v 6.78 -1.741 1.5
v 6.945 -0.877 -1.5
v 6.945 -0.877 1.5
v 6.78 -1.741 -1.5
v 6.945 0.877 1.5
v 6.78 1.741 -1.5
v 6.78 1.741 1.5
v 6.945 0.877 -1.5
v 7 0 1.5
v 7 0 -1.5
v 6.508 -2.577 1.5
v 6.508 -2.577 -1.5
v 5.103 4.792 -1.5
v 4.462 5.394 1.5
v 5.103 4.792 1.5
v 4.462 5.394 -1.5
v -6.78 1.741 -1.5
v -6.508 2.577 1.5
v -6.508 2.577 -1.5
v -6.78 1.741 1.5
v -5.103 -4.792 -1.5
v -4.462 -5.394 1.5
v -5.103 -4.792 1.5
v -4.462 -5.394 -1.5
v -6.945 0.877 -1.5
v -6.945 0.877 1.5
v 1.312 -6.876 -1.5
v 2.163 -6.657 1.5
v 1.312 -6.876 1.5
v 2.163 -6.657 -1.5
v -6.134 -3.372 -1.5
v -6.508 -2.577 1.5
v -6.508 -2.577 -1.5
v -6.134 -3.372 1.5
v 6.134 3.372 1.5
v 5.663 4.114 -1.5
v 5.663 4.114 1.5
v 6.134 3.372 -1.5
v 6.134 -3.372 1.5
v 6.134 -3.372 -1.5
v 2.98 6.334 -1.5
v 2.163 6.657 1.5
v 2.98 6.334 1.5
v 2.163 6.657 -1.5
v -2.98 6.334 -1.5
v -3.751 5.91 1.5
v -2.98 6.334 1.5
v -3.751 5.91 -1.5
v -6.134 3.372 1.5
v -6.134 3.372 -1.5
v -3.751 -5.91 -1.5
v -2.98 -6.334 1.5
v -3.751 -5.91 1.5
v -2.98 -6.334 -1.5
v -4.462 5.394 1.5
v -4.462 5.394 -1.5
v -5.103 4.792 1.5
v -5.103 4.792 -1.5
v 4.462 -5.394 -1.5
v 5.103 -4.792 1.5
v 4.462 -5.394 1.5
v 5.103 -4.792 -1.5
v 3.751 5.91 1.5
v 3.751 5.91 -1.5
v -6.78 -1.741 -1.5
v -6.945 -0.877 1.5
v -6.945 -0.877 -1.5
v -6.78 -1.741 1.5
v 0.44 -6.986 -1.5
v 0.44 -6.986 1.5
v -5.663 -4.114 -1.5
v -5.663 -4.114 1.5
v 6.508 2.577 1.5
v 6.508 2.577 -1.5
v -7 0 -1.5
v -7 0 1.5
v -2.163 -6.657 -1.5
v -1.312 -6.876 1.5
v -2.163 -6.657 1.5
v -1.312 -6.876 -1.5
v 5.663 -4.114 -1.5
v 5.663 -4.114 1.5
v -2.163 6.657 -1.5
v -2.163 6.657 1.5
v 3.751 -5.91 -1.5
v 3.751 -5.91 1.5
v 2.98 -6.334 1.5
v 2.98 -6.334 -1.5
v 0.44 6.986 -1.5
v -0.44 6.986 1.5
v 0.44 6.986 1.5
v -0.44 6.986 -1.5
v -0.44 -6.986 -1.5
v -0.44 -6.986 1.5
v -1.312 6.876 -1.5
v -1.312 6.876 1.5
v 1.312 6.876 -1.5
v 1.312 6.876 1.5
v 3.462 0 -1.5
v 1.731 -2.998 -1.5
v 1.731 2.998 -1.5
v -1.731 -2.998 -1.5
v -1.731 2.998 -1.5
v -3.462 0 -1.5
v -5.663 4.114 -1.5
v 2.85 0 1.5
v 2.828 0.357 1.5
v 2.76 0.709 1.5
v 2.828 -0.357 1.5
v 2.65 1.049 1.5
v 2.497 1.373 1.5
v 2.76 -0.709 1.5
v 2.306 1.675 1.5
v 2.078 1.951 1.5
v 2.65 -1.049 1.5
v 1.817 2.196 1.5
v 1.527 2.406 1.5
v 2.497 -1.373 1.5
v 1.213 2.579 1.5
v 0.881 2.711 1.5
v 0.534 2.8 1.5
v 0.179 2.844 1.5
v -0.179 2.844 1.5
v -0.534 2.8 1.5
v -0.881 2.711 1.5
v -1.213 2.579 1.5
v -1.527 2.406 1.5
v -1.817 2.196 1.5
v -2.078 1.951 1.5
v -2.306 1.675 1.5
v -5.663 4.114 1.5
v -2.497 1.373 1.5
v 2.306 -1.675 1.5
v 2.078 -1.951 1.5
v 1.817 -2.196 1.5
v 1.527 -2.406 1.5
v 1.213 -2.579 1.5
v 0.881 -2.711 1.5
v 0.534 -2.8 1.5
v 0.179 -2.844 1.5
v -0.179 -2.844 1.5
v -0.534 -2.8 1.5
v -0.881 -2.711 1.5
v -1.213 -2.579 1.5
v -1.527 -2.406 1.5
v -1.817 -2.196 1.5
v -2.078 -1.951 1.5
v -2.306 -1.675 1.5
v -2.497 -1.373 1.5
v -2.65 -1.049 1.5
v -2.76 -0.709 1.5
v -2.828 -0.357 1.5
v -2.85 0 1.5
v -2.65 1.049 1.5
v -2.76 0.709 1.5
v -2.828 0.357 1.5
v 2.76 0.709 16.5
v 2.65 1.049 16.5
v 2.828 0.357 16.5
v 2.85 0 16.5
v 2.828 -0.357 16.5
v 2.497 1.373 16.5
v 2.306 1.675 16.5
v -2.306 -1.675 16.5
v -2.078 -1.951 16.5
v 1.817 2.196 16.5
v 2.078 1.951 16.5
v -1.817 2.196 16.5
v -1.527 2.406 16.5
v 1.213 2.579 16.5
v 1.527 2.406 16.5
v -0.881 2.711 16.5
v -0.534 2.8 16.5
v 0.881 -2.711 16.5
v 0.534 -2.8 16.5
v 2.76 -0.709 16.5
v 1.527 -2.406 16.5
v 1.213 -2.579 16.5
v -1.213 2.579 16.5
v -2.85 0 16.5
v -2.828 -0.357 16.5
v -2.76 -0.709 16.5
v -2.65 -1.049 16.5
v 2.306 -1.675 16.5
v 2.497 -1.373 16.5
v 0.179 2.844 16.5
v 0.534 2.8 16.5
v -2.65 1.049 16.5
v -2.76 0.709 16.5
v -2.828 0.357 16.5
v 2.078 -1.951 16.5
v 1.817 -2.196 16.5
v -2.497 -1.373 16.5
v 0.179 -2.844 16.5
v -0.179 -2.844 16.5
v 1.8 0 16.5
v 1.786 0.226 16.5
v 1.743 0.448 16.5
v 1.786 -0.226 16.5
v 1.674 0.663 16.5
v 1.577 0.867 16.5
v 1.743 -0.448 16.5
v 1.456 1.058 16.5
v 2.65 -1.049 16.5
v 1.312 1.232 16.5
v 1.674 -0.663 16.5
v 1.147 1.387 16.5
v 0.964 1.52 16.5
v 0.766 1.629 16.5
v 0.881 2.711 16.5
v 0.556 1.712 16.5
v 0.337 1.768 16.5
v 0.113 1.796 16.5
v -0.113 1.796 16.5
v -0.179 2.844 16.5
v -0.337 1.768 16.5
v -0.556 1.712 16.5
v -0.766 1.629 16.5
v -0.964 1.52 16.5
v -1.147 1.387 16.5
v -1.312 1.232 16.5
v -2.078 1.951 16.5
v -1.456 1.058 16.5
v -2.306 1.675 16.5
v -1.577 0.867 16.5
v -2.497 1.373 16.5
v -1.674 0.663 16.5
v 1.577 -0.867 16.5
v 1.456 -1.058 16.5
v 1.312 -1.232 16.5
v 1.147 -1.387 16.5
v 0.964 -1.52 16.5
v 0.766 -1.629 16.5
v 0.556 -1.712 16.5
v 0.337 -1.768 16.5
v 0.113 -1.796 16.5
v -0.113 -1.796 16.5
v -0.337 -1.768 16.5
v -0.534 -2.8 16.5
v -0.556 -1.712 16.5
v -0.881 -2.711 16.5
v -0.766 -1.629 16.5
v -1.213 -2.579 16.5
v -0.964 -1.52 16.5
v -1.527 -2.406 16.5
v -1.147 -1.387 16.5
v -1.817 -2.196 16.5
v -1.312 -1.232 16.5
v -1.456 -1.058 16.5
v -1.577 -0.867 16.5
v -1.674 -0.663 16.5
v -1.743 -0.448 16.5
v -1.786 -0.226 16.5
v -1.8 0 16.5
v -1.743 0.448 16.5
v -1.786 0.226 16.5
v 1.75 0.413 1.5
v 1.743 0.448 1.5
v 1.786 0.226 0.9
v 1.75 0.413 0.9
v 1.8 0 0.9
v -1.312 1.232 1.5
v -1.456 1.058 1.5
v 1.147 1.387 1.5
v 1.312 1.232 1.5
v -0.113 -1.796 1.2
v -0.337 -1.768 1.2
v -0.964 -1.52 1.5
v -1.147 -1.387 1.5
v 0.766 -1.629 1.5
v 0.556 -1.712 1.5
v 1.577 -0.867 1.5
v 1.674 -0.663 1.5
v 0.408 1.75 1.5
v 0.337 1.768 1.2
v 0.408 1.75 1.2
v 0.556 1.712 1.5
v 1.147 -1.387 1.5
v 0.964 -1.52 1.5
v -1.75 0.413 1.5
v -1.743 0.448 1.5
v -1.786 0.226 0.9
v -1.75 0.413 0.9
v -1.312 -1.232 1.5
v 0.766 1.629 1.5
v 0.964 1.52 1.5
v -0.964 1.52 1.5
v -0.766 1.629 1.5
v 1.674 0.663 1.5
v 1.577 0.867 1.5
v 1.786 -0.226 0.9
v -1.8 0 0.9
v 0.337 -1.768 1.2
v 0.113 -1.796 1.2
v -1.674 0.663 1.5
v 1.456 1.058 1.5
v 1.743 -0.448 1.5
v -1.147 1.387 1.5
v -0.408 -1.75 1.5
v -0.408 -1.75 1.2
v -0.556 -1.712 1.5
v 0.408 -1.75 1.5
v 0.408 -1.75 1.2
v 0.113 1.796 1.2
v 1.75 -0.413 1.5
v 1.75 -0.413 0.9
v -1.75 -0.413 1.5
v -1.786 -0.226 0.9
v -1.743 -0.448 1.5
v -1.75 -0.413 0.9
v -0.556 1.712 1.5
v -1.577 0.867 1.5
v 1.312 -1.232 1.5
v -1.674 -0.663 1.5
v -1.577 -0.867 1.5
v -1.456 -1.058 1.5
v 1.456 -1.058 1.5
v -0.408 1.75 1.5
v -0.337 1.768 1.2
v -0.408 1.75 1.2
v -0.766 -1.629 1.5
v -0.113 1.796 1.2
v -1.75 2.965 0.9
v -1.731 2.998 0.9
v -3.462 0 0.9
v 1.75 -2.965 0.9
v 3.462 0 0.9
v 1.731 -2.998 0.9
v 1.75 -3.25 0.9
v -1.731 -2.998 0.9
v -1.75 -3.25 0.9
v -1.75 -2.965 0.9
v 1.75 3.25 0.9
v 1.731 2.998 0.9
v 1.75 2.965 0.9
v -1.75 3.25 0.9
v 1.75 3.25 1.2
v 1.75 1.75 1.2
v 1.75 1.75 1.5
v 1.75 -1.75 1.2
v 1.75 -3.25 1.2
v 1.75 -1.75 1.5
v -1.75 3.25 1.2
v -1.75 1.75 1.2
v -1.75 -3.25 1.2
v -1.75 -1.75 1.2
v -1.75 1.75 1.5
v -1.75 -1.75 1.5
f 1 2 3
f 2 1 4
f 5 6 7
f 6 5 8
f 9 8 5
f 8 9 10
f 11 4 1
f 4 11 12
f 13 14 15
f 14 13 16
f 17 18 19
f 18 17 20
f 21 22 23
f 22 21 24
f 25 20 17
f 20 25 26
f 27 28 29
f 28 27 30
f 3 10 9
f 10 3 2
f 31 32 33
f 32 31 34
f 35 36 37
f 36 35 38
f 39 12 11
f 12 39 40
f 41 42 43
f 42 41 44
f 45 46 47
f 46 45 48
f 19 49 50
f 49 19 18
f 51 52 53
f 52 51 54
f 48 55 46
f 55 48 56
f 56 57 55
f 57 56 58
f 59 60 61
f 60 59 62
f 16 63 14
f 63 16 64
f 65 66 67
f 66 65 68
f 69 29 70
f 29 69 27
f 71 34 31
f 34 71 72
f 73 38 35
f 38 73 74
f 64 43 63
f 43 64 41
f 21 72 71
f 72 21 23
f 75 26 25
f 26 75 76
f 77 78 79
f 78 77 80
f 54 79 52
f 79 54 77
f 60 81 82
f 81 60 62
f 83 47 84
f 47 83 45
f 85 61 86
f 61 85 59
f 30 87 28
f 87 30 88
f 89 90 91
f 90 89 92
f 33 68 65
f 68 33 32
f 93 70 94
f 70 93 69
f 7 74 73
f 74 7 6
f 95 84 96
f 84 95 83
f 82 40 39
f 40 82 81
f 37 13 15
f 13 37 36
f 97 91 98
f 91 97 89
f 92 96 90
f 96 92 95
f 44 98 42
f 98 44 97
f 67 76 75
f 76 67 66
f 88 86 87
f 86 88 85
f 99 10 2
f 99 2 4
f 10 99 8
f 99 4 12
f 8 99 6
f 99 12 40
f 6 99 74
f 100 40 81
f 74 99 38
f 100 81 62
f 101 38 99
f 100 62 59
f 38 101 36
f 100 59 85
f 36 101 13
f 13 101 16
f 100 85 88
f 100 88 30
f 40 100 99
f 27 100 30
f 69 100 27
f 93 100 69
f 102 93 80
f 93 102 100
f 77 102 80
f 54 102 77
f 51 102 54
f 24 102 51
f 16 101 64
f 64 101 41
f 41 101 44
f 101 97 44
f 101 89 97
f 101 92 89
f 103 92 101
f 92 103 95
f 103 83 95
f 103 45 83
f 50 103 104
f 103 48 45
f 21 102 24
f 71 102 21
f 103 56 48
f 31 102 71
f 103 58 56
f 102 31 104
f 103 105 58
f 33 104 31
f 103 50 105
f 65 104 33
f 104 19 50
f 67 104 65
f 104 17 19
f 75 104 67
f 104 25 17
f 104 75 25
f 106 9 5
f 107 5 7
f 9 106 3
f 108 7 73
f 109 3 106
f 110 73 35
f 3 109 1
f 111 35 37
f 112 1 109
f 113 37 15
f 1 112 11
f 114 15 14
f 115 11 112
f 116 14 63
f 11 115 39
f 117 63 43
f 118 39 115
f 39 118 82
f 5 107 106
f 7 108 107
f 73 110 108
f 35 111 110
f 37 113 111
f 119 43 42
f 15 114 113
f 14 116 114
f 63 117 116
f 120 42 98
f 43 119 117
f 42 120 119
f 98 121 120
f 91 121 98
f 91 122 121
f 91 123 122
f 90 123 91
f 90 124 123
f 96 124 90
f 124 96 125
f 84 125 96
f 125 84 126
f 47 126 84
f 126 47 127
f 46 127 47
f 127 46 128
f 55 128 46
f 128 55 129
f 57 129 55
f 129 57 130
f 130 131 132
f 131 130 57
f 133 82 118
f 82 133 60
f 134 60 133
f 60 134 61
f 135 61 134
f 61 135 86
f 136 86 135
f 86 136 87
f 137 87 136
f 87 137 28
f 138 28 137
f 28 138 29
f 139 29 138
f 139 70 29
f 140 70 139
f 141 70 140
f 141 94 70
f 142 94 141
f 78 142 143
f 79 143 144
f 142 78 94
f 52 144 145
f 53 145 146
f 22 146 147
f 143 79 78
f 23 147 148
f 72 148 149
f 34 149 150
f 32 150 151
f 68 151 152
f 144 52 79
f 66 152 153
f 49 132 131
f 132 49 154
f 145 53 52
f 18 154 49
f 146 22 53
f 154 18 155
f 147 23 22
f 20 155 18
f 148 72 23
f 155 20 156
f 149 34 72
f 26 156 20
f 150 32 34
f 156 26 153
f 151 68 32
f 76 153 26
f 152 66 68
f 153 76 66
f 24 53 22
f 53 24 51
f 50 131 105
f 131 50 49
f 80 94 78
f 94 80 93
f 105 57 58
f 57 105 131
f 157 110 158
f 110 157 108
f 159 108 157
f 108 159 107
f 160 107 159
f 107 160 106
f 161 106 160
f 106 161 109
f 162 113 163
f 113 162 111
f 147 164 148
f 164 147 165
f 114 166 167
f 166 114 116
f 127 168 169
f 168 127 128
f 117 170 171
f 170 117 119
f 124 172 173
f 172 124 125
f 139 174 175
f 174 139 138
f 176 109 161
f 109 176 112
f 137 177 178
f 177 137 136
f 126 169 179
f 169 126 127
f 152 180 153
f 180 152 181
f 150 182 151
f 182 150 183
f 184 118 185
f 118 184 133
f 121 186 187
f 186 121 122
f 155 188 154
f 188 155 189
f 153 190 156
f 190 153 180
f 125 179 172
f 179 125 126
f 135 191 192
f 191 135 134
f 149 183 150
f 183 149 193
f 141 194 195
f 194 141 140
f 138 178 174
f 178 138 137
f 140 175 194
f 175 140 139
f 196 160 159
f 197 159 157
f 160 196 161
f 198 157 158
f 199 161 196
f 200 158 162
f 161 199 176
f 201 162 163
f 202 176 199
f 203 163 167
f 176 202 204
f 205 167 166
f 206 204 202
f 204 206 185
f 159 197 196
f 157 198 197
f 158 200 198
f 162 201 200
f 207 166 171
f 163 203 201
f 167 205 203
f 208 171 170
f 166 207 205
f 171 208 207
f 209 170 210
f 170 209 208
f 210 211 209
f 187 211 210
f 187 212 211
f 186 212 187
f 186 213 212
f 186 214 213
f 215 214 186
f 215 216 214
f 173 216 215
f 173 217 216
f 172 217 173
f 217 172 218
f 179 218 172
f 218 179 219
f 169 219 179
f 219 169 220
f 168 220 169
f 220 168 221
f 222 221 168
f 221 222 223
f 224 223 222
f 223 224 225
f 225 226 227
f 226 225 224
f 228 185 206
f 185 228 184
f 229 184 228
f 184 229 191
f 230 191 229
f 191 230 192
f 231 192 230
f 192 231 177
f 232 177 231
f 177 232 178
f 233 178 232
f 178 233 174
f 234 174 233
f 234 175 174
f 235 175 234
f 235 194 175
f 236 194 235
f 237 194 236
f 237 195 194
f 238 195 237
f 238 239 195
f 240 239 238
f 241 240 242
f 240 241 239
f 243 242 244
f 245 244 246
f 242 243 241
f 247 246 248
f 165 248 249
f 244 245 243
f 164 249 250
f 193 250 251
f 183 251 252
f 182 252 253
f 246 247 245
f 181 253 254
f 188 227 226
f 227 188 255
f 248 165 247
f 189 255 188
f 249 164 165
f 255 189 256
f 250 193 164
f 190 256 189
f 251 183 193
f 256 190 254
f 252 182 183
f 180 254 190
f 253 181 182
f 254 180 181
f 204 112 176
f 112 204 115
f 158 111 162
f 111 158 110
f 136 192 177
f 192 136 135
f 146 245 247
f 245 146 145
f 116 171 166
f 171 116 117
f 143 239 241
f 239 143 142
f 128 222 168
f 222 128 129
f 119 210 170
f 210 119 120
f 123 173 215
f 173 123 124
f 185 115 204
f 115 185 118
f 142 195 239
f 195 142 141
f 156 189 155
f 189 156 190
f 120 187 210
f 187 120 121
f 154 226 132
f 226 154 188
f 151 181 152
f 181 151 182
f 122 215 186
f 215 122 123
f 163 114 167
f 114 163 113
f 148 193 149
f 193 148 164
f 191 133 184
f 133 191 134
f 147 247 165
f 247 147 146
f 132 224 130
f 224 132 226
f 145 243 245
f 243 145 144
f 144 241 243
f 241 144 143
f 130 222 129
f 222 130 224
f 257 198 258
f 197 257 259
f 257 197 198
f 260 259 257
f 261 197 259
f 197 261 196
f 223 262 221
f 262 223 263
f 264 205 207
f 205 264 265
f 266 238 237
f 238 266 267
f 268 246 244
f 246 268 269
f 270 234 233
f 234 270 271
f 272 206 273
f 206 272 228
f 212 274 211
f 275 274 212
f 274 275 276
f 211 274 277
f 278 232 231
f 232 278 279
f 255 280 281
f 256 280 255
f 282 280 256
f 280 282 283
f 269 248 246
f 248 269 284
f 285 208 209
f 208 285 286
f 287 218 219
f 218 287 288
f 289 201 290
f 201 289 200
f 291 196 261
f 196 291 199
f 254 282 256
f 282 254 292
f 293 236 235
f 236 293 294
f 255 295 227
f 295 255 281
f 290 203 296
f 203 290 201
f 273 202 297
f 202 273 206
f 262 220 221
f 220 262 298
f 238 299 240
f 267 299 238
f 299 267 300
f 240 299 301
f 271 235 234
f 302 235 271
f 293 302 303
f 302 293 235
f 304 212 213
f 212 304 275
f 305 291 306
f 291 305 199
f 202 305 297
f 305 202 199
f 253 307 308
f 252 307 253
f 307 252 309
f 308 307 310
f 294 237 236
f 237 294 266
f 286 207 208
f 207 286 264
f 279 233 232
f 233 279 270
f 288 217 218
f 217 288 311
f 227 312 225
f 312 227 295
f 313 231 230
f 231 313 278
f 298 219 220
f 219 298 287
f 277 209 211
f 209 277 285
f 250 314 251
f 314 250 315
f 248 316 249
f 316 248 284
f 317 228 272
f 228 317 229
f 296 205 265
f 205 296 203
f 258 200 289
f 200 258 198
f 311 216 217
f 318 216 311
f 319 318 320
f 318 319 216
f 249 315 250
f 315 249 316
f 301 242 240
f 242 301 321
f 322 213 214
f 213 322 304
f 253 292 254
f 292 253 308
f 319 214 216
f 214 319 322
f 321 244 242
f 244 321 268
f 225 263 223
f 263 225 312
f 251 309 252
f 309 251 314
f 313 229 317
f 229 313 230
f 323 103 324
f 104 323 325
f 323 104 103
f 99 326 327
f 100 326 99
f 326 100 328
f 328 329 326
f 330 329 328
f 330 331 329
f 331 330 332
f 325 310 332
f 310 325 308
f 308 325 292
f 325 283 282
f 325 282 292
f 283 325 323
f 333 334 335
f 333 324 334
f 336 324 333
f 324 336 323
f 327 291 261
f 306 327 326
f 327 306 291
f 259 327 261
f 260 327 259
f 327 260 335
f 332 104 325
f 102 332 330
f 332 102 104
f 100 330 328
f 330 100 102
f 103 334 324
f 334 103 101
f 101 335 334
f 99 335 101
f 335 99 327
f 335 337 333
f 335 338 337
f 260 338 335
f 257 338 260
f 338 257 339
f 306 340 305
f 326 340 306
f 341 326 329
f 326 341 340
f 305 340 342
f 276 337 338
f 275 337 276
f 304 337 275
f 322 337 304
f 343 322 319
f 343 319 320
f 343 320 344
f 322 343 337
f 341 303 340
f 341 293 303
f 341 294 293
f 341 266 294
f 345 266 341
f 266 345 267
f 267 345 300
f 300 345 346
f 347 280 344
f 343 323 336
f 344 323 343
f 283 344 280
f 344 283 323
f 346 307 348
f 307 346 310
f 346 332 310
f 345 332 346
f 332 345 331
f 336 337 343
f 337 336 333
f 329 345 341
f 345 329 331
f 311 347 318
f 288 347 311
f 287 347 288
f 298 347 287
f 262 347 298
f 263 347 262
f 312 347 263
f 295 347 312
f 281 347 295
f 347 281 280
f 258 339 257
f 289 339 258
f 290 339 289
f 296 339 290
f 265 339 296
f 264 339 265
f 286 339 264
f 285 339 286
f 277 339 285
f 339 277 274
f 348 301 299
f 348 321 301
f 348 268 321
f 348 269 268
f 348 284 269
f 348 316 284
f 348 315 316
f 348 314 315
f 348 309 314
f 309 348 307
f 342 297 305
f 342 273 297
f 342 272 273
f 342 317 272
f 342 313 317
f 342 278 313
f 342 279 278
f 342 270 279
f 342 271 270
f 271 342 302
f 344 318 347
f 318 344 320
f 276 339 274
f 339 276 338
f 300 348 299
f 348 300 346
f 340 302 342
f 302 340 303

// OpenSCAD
$fn = 50;


difference() {
	union() {
		translate(v = [0, 0, -1.5000000000]) {
			rotate(a = [0, 0, 0]) {
				cylinder(h = 3, r = 7.0000000000);
			}
		}
		translate(v = [0, 0, -1.5000000000]) {
			rotate(a = [0, 0, 0]) {
				cylinder(h = 18, r = 2.8500000000);
			}
		}
	}
	union() {
		translate(v = [0, 0, -125.0000000000]) {
			rotate(a = [0, 0, 0]) {
				cylinder(h = 250, r = 1.8000000000);
			}
		}
		translate(v = [0, 0, -2.1000000000]) {
			rotate(a = [0, 0, 0]) {
				#translate(v = [0, 0, 0]) {
					rotate(a = [0, 0, 0]) {
						linear_extrude(height = 3) {
							polygon(points = [[3.4620000000, 0.0000000000], [1.7310000000, 2.9981799479], [-1.7310000000, 2.9981799479], [-3.4620000000, 0.0000000000], [-1.7310000000, -2.9981799479], [1.7310000000, -2.9981799479]]);
						}
					}
				}
			}
		}
		#translate(v = [-1.7500000000, -3.2500000000, 0.9000000000]) {
			rotate(a = [0, 0, 0]) {
				cube(size = [3.5000000000, 6.5000000000, 0.3000000000]);
			}
		}
		#translate(v = [-1.7500000000, -1.7500000000, 1.2000000000]) {
			rotate(a = [0, 0, 0]) {
				cube(size = [3.5000000000, 3.5000000000, 0.3000000000]);
			}
		}
		#translate(v = [-1.7500000000, -3.2500000000, -2.4000000000]) {
			rotate(a = [0, 0, 0]) {
				cube(size = [3.5000000000, 6.5000000000, 0.3000000000]);
			}
		}
		#translate(v = [-1.7500000000, -1.7500000000, -2.7000000000]) {
			rotate(a = [0, 0, 0]) {
				cube(size = [3.5000000000, 3.5000000000, 0.3000000000]);
			}
		}
	}
}
